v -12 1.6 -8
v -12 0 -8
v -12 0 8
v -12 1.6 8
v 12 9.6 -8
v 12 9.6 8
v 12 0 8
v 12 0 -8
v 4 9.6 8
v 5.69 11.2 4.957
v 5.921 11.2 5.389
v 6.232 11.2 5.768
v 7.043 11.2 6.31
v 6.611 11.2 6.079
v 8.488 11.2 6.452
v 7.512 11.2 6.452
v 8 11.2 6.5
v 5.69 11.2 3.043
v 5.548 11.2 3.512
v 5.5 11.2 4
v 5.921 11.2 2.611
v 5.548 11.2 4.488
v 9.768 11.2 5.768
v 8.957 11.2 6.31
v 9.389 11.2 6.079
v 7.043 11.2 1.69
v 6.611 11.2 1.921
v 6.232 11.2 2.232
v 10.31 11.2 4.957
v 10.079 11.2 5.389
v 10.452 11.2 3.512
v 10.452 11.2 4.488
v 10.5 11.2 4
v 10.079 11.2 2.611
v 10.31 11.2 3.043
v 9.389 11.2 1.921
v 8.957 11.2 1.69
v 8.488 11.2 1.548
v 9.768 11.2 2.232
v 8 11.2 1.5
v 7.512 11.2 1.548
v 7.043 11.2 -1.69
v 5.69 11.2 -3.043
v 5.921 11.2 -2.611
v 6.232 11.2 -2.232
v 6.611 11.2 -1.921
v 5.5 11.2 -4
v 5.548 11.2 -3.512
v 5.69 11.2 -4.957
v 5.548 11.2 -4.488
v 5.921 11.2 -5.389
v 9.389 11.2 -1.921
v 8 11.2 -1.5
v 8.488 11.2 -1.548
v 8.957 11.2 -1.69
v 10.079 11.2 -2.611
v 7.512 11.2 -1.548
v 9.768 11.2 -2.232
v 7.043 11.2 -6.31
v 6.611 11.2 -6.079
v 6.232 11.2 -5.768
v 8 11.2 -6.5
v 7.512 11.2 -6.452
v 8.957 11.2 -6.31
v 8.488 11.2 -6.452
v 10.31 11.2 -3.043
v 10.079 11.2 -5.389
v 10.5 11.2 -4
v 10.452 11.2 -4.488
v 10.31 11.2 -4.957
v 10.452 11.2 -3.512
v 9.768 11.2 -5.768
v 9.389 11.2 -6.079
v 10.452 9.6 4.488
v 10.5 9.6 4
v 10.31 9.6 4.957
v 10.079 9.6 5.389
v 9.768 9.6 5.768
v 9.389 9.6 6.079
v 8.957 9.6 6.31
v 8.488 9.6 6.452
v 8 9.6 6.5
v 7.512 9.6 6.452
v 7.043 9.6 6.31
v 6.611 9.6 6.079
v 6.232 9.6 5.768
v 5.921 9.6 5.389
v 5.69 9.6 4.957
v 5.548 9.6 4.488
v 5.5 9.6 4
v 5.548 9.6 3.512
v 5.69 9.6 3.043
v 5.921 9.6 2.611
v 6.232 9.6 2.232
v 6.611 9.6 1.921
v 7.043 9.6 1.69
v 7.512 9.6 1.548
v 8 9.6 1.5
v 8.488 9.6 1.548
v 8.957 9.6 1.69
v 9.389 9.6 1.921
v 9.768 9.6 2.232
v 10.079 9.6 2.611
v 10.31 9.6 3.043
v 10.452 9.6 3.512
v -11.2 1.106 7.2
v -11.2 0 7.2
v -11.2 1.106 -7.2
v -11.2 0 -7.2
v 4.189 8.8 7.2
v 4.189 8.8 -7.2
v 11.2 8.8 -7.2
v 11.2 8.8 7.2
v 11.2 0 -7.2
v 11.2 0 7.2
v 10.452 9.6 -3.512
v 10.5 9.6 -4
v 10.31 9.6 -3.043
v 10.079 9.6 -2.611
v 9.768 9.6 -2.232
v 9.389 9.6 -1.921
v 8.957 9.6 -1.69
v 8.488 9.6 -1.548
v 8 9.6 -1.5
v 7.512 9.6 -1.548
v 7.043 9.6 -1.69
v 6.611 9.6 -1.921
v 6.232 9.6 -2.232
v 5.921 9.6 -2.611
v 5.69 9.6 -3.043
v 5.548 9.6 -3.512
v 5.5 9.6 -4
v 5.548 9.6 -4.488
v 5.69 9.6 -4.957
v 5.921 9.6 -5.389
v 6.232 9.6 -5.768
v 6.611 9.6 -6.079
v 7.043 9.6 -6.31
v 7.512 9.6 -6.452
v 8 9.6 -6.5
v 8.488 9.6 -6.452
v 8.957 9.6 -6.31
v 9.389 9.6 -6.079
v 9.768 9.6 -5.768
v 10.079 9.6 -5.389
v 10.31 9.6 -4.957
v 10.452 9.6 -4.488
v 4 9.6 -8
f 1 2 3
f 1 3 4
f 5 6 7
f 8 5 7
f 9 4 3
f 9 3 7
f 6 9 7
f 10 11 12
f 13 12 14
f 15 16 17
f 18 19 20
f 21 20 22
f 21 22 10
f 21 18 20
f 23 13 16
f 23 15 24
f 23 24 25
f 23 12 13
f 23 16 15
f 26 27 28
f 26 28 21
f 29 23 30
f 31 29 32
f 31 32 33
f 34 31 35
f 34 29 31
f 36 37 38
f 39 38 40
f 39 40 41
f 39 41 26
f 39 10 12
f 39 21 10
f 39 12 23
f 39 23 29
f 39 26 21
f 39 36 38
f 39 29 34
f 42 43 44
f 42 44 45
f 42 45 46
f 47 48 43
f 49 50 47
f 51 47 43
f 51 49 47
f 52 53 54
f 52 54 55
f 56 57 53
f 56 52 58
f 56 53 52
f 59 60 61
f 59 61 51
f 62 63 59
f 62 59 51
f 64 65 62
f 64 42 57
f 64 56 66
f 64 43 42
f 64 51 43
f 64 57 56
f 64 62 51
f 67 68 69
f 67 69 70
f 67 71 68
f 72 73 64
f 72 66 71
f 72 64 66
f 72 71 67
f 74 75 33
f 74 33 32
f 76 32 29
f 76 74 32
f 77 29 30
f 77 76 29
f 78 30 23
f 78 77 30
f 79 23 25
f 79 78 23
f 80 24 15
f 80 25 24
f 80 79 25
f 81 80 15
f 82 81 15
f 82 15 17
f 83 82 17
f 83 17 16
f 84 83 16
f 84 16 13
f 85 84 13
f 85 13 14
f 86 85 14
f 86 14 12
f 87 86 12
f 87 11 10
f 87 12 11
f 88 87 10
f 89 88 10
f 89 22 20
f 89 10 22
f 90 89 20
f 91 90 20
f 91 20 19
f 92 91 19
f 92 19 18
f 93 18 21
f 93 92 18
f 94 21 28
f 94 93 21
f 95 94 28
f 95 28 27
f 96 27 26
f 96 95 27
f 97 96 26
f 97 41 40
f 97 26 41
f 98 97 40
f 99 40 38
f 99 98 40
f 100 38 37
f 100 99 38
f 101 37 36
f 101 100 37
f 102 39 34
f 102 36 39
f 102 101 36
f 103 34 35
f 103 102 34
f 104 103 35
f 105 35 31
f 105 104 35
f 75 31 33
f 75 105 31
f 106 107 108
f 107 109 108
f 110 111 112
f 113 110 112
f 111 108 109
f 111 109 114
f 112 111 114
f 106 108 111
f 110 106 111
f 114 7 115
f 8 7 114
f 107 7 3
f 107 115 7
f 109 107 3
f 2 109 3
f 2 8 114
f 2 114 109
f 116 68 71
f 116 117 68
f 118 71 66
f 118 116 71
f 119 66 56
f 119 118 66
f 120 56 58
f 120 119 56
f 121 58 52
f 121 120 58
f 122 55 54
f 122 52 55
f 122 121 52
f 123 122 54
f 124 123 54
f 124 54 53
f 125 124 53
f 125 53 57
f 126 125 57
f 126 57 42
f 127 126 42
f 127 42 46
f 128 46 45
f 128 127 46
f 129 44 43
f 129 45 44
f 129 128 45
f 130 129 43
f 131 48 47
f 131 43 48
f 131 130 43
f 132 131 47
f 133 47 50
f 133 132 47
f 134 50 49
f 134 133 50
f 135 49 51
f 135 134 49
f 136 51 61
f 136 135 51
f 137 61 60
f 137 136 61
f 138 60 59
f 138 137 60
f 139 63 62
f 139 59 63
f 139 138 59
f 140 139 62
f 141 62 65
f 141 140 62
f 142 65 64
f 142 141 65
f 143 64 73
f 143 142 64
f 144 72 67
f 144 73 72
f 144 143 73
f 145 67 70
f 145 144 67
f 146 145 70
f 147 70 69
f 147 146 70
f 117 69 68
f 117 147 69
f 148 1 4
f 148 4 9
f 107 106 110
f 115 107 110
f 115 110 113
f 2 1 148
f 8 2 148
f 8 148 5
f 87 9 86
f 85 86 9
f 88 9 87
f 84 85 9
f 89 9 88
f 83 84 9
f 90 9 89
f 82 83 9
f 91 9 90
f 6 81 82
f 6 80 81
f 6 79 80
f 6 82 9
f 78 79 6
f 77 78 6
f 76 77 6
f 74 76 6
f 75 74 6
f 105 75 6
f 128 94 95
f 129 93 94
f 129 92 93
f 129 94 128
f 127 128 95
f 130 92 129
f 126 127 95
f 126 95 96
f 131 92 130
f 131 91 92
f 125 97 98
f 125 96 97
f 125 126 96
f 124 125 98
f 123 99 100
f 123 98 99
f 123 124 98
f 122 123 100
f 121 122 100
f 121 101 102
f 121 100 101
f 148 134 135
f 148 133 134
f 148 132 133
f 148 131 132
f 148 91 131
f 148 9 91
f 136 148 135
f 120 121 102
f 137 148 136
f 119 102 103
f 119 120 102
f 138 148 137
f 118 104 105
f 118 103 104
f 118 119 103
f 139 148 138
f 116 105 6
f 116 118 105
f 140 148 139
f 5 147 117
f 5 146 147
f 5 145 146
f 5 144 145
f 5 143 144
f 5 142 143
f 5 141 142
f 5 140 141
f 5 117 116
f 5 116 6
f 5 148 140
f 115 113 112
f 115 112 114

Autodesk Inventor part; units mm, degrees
ref_plane "YZ Plane" through (0, 0, 0) normal (1, 0, 0) x (0, 1, 0)
ref_plane "XZ Plane" through (0, 0, 0) normal (0, 1, 0) x (-1, 0, 0)
ref_plane "XY Plane" through (0, 0, 0) normal (0, 0, 1) x (1, 0, 0)
sketch "Sketch1" plane through (0, 0, 0) normal (0, 0, 1) x (1, 0, 0)
  line L0 (12, 0) -> (-12, 0)
  line L1 (-12, 0) -> (-12, 1.6)
  line L2 (-12, 1.6) -> (4, 9.6)
  line L3 (4, 9.6) -> (12, 9.6)
  line L4 (12, 9.6) -> (12, 0)
  point P0 (0, 0)
  point P1 (0, 0)
  dimension "d0" = 9.6
  dimension "d1" = 24
  dimension "d2" = 16
  dimension "d3" = 1.6
extrude "Extrusion1" add sketch "Sketch1" along normal mid plane 16
shell "Shell1" thickness 0.8 removed faces 1 at (-4, 0, 2.6667)
sketch "Sketch2" plane through (4, 9.6, 8) normal (0, 1, 0) x (1, 0, 0)
  line L0 (4, 12) -> (4, 4) construction
  line L1 (-20.8, 8) -> (12.8, 8) construction
  line L2 (8, 0) -> (8, 16) construction
  circle A0 centre (4, 12) radius 2.5
  circle A1 centre (4, 4) radius 2.5
  point P0 (4, 8)
  dimension "d6" = 4
  dimension "d7" = 8
  dimension "d8" = 5
extrude "Extrusion2" add sketch "Sketch2" along normal blind 1.6
properties part number "LEGO Brick 3298" material "Steel"
